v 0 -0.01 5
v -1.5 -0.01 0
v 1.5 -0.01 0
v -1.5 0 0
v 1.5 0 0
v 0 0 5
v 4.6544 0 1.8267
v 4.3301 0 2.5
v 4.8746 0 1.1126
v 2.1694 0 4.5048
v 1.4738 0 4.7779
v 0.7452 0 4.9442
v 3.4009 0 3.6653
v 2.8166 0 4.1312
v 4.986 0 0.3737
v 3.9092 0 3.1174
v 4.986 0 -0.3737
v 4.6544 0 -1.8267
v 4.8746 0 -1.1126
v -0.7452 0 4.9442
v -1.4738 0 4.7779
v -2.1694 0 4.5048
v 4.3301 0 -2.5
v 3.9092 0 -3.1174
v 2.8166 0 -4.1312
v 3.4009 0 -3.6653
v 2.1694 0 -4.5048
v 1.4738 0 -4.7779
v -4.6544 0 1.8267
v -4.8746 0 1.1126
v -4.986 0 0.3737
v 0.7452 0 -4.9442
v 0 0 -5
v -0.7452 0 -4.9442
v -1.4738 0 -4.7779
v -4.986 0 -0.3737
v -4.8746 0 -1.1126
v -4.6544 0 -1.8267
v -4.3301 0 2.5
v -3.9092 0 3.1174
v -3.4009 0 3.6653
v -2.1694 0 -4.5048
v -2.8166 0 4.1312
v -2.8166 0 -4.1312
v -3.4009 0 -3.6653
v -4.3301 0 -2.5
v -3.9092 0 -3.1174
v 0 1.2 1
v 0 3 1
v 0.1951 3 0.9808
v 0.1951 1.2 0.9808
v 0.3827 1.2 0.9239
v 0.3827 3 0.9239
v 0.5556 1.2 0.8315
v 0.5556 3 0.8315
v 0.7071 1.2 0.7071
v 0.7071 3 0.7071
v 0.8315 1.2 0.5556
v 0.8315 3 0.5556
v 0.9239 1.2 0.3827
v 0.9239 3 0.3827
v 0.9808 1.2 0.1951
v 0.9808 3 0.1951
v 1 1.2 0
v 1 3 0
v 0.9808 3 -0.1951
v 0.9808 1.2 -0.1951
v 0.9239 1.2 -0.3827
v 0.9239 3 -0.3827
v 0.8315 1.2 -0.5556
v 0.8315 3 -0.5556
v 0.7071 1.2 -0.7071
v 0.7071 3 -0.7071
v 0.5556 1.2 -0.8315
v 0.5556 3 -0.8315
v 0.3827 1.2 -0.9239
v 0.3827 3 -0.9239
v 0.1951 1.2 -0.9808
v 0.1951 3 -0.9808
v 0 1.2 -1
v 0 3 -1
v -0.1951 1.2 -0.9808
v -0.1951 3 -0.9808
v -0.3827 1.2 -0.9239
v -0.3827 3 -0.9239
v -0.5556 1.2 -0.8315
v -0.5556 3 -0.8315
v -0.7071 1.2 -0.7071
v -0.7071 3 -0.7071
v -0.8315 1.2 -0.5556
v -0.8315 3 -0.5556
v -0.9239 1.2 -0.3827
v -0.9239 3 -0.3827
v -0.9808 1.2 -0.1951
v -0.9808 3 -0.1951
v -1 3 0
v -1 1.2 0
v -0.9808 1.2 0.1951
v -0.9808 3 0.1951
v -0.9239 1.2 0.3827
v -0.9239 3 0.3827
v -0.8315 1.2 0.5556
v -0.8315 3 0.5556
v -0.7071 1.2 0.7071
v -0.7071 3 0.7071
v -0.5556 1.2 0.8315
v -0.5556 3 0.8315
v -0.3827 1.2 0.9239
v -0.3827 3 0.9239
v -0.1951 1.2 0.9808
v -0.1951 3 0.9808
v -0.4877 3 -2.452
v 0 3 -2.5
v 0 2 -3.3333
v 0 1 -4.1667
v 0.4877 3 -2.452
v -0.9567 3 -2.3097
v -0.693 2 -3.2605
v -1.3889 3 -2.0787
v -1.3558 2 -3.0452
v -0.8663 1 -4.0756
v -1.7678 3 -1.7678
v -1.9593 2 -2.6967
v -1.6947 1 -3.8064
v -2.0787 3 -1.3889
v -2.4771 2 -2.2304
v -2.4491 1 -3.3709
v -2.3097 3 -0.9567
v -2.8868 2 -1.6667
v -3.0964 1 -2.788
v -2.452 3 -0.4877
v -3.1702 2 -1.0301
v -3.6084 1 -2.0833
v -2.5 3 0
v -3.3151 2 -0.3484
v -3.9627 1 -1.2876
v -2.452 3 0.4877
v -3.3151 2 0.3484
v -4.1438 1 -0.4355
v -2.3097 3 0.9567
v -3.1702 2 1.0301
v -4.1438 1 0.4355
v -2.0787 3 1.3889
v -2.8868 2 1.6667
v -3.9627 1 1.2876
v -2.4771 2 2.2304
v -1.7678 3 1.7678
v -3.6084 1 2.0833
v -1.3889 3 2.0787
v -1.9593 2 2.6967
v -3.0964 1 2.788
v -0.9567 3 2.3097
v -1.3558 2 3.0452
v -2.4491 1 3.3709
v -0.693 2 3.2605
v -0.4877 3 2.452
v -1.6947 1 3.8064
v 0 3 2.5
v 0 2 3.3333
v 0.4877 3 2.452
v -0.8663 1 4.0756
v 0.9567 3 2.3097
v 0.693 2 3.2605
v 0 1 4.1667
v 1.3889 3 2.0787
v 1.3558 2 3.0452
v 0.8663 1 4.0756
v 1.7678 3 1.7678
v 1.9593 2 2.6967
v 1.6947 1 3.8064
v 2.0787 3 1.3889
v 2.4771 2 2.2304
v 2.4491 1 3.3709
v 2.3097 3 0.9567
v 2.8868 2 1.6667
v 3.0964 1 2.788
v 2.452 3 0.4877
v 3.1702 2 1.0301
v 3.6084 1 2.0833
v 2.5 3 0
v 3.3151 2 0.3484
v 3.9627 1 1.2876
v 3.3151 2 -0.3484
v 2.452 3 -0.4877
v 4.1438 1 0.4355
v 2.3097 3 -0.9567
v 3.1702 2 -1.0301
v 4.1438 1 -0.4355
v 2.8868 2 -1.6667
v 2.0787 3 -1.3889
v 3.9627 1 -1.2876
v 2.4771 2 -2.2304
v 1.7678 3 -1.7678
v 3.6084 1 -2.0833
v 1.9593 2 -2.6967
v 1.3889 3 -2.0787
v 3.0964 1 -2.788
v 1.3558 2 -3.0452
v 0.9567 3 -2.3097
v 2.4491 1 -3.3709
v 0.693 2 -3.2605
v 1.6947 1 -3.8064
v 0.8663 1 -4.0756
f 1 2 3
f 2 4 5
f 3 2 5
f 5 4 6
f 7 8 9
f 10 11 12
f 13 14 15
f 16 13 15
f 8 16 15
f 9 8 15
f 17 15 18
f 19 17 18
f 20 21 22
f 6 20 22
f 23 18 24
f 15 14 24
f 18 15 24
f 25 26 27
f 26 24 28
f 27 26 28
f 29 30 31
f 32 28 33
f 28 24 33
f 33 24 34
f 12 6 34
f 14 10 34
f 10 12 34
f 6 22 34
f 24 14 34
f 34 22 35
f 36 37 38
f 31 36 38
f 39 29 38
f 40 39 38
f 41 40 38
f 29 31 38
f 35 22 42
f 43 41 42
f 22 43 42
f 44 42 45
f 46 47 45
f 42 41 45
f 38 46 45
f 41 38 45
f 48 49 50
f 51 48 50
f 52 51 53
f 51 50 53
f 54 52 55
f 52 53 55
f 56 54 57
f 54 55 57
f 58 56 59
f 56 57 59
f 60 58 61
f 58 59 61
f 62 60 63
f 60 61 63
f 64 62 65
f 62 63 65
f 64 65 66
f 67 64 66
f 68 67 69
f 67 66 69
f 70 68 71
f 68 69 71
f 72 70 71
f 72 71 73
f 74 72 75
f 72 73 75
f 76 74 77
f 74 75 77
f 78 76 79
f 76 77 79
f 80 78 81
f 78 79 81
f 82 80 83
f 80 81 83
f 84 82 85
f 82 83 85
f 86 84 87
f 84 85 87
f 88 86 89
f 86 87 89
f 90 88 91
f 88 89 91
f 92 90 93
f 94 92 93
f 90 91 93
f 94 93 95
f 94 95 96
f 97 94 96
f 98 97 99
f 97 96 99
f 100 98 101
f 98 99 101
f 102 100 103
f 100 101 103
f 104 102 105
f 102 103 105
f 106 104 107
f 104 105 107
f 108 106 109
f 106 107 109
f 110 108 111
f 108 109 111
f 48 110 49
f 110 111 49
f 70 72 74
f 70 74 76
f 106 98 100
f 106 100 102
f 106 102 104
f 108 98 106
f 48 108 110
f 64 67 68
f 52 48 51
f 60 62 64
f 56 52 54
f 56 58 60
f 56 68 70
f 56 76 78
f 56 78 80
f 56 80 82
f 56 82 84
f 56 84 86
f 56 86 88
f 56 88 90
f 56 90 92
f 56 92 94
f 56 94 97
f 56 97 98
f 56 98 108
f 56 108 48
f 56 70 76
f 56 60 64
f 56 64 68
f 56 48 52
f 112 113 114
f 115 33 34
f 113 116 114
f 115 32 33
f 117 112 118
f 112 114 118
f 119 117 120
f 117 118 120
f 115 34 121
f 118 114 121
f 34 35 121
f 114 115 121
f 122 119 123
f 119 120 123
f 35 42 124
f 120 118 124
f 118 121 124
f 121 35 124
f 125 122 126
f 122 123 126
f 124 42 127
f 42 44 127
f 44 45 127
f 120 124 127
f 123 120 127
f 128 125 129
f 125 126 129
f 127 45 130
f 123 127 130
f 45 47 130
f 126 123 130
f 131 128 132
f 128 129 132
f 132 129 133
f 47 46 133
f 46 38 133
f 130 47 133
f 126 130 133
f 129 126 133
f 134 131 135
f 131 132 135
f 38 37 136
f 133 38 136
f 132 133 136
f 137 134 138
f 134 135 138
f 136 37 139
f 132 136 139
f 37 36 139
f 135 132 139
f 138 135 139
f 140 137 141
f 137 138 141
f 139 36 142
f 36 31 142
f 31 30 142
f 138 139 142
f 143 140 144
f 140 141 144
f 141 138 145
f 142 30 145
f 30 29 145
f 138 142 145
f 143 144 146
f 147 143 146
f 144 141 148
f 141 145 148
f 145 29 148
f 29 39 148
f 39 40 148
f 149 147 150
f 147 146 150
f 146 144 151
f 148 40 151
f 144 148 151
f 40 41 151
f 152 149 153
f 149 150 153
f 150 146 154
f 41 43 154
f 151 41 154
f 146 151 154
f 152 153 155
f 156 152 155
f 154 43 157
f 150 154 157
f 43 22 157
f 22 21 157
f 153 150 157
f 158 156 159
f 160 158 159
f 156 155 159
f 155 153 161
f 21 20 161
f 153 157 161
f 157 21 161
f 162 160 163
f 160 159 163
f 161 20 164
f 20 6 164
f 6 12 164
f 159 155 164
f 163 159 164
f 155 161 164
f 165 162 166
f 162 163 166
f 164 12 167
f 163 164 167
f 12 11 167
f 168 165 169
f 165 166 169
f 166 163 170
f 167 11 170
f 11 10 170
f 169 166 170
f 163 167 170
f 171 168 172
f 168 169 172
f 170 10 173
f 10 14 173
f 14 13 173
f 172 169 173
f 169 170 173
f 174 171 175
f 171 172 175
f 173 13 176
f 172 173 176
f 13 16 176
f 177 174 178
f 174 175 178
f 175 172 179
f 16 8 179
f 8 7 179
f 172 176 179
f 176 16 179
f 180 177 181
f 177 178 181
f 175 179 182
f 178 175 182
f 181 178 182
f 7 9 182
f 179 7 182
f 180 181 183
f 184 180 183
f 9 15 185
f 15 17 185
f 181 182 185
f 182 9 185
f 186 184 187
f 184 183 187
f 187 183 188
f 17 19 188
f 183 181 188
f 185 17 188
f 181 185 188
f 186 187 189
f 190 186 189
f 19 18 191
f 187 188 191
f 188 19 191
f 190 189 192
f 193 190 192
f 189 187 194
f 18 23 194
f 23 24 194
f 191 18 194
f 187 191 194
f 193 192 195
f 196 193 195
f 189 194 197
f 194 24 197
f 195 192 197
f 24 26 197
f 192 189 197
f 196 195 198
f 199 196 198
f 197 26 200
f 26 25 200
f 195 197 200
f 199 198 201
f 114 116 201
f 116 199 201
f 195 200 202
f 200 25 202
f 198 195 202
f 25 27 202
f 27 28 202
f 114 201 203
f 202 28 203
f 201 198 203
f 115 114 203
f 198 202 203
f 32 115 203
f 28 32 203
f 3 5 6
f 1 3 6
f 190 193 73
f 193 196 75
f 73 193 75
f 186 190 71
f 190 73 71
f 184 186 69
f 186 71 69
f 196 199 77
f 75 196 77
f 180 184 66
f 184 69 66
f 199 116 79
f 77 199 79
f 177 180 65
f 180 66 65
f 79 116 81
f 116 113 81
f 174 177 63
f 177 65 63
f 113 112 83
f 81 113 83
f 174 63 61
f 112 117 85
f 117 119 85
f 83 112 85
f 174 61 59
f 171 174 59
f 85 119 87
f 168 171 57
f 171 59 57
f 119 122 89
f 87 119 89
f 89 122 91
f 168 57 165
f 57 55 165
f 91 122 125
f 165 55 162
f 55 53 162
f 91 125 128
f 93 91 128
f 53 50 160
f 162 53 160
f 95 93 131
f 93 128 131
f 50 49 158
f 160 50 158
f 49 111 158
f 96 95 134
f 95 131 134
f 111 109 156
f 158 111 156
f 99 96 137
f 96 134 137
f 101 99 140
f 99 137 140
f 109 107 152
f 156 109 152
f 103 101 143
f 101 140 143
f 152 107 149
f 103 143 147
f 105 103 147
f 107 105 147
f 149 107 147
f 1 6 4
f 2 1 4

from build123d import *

# Parameters (mm, degrees)
SKETCH_2_R          = 1
CUT_EXTRUDE_1_DEPTH = 1.8
EXTRUDE_1_DEPTH     = 0.01


with BuildPart() as part:
    # 草图1 → 旋转1 (revolve)
    with BuildSketch(Plane.XY, mode=Mode.PRIVATE) as revolve_1_sk:
        Polygon((0, 0), (0, 3), (-2.5, 3), (-5, 0), align=None)
    revolve(revolve_1_sk.sketch.rotate(Axis((0, 0, 0), (0, 1, 0)), 270), axis=Axis((0, 0, 0), (0, 1, 0)))

    # 草图2 → 切除-拉伸1 (cut)
    with BuildSketch(Plane(origin=(0, 3, 0), x_dir=(1, 0, 0), z_dir=(0, 1, 0))):
        with Locations(Location((0, 0, 0), (0, 0, 270))):
            Circle(SKETCH_2_R)
    extrude(amount=-CUT_EXTRUDE_1_DEPTH, mode=Mode.SUBTRACT)


with BuildPart() as body_2:
    # 草图3 → 凸台-拉伸1 (new body)
    with BuildSketch(Plane.XZ):
        Polygon((-1.5, 0), (1.5, 0), (0, 5), align=None)
    extrude(amount=EXTRUDE_1_DEPTH)


solid = Compound([part.part, body_2.part])
